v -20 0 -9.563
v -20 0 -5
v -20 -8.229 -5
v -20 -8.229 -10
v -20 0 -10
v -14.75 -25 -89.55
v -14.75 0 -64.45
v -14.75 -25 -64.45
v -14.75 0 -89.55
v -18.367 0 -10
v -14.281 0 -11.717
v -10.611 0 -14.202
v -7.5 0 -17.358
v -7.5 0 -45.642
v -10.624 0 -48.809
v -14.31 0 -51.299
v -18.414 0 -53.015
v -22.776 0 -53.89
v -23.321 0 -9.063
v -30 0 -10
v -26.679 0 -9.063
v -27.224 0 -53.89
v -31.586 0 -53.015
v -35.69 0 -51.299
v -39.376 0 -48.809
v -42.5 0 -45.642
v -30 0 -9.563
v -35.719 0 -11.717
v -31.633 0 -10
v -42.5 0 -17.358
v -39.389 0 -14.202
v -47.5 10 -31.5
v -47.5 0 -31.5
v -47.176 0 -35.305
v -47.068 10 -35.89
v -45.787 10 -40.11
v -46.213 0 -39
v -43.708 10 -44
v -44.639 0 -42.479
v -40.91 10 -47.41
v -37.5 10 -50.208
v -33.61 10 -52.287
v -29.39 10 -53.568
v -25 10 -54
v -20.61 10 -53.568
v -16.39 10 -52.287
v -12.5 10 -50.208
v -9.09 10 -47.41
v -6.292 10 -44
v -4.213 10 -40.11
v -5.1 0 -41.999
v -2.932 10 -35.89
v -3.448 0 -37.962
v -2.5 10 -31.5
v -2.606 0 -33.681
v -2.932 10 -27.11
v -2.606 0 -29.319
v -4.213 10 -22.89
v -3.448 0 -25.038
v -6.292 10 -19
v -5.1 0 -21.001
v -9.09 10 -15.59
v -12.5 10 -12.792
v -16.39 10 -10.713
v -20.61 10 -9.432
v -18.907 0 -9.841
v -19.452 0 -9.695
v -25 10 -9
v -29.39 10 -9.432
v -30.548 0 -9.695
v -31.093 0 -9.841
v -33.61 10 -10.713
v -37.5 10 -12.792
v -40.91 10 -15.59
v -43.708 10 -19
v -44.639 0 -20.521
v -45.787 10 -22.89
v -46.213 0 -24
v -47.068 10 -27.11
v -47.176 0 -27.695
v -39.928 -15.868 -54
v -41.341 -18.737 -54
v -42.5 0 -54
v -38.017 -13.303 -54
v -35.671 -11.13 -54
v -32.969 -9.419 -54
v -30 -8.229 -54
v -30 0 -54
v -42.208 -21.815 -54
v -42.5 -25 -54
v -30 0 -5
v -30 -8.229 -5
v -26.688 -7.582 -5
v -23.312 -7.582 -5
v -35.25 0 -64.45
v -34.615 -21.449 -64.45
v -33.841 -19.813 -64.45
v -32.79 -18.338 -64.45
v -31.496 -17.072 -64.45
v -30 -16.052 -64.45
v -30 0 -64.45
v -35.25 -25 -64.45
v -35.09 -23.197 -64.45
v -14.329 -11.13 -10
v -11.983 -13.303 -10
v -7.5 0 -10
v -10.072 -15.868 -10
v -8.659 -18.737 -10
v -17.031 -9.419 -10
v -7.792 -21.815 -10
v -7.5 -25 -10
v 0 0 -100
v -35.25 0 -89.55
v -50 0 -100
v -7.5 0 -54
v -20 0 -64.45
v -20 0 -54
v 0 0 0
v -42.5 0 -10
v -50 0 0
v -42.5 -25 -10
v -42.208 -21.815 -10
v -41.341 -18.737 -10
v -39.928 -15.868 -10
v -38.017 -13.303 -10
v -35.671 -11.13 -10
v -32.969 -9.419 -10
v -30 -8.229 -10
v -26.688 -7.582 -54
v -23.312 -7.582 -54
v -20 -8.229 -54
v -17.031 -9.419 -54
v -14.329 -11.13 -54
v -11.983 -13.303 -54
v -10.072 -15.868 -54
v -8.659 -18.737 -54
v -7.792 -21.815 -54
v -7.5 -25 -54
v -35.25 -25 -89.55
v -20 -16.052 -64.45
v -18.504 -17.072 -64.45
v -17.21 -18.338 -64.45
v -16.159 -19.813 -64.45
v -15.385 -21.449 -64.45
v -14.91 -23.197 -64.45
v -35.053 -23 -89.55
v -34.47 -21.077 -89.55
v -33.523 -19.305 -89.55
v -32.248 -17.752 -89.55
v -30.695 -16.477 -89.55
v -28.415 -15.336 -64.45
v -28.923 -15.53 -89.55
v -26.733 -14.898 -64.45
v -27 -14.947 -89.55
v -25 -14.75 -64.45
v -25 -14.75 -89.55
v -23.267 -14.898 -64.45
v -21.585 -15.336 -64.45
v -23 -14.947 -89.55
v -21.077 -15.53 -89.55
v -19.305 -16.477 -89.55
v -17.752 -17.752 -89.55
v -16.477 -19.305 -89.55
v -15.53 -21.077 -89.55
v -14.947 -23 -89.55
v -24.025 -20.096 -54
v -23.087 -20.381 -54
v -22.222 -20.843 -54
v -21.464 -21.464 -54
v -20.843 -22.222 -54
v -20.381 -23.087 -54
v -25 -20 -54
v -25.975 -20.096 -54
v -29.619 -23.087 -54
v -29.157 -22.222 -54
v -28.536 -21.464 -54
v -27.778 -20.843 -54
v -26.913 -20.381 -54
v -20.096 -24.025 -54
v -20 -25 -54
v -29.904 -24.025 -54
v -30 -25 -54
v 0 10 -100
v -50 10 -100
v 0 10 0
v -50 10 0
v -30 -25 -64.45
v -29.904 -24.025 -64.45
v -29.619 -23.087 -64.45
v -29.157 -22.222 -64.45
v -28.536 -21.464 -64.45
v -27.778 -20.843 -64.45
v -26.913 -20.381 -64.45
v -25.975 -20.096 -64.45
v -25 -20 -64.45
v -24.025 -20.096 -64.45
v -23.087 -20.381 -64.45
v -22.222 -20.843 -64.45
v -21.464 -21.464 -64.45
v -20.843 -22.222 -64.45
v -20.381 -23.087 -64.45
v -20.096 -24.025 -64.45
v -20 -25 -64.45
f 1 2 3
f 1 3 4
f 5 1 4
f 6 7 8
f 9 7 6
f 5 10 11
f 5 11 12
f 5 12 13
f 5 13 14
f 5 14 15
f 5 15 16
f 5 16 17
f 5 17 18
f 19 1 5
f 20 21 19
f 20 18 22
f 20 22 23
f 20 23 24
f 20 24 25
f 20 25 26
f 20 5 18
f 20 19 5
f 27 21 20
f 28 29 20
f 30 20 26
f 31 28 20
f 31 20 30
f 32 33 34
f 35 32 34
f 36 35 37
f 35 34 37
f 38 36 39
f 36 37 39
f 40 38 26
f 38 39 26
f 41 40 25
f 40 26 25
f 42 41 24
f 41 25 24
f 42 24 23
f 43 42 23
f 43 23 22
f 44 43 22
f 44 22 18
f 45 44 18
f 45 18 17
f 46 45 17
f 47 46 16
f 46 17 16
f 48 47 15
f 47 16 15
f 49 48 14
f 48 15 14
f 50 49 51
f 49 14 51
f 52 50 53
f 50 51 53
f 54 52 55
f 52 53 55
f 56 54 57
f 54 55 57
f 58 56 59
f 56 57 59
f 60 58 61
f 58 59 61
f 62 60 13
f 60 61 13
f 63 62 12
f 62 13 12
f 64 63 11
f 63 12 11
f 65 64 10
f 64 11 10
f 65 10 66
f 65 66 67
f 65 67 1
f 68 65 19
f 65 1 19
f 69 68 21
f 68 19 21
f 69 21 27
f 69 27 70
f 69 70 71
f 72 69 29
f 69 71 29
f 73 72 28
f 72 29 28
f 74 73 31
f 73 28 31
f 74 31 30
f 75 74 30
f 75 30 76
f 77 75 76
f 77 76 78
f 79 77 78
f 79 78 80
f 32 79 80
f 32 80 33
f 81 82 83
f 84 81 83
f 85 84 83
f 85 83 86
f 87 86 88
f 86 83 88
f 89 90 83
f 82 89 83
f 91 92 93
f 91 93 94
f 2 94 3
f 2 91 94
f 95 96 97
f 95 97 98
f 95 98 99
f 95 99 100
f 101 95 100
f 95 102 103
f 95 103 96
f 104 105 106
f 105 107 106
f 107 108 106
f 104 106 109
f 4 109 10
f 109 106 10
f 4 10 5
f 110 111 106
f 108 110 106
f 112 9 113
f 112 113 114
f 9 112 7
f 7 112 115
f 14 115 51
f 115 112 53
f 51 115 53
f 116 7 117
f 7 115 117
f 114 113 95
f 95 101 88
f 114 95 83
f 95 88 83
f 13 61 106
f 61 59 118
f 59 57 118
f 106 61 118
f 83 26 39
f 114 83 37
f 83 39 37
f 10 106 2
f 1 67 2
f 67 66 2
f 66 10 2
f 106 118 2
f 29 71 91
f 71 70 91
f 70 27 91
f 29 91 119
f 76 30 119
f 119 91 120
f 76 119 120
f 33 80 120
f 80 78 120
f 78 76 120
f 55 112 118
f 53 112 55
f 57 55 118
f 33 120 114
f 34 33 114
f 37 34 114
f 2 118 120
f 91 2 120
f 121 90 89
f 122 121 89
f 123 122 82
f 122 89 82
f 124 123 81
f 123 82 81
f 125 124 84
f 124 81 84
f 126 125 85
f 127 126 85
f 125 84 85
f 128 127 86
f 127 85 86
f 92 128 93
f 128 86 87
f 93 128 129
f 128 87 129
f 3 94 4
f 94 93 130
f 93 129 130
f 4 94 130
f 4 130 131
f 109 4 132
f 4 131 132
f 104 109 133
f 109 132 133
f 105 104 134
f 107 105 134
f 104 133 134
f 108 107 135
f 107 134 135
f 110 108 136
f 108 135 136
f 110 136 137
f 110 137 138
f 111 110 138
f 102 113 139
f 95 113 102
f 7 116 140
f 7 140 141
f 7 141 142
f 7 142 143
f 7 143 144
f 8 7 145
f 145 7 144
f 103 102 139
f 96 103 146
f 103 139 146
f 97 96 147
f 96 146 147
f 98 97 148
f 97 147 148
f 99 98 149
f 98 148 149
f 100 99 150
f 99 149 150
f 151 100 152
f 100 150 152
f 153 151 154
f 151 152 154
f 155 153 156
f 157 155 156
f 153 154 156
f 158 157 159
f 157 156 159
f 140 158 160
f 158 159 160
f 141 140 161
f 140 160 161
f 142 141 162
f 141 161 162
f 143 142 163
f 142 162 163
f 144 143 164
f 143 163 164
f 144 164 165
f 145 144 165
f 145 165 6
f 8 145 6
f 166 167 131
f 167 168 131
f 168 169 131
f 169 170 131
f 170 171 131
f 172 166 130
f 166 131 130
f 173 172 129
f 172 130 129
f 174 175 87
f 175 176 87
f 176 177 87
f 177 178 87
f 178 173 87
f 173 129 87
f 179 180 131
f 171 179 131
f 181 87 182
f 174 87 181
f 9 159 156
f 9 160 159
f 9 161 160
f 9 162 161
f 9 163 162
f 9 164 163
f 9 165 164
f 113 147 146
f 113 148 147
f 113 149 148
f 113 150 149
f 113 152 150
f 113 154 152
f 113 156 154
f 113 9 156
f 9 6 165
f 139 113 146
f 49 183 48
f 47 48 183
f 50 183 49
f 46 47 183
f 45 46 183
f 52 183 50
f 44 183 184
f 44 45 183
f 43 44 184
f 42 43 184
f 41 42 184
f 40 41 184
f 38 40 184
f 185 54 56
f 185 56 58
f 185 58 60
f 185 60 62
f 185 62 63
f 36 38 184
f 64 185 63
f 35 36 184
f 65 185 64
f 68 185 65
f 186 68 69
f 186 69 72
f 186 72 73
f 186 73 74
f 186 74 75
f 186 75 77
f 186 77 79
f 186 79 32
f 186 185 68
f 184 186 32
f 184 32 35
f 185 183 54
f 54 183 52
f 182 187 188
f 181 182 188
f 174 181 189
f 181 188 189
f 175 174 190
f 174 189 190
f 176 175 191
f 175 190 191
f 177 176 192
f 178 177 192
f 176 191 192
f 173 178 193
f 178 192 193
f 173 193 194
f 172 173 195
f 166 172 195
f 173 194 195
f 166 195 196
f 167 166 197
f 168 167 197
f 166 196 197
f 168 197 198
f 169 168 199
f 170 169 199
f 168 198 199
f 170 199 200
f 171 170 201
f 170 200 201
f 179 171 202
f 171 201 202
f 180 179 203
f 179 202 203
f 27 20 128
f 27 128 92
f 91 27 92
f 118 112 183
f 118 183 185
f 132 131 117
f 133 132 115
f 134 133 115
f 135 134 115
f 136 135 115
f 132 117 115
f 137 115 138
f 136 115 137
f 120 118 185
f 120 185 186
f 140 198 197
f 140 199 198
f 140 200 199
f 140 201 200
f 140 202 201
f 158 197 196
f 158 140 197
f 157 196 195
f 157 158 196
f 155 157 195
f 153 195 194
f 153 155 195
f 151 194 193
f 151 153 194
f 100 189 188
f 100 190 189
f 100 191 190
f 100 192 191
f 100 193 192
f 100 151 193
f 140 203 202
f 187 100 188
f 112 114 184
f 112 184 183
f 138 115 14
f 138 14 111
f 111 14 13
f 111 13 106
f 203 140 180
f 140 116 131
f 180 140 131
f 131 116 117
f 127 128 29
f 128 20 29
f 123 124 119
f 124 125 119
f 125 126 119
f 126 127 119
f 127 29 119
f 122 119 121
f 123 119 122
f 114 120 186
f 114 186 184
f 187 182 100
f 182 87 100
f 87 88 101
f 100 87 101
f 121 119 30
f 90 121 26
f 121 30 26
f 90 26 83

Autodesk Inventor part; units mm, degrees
ref_plane "YZ Plane" through (0, 0, 0) normal (1, 0, 0) x (0, 1, 0)
ref_plane "XZ Plane" through (0, 0, 0) normal (0, 1, 0) x (-1, 0, 0)
ref_plane "XY Plane" through (0, 0, 0) normal (0, 0, 1) x (1, 0, 0)
sketch "Sketch1" plane through (0, 0, 0) normal (0, 1, 0) x (-1, 0, 0)
  line L0 (0, 0) -> (50, 0)
  line L1 (50, 0) -> (50, -100)
  line L2 (50, -100) -> (0, -100)
  line L3 (0, -100) -> (0, 0)
  line L4 (25, 0) -> (25, -100)
  line L5 (7.5, -54) -> (7.5, -10)
  line L6 (7.5, -10) -> (42.5, -10)
  line L7 (42.5, -10) -> (42.5, -54)
  line L8 (42.5, -54) -> (7.5, -54)
  line L9 (7.5, -54) -> (42.5, -10) construction
  line L10 (7.5, -10) -> (42.5, -54) construction
  line L11 (7.5, -54) -> (51.5, -54) construction
  line L12 (14.75, -64.45) -> (14.75, -89.55)
  line L13 (14.75, -89.55) -> (35.25, -89.55)
  line L14 (35.25, -89.55) -> (35.25, -64.45)
  line L15 (35.25, -64.45) -> (14.75, -64.45)
  line L16 (14.75, -64.45) -> (35.25, -89.55) construction
  line L17 (14.75, -89.55) -> (35.25, -64.45) construction
  line L18 (14.75, -64.45) -> (39.85, -64.45) construction
  line L19 (25, -10) -> (25, -15)
  line L20 (25, -10) -> (30, -10) construction
  line L21 (20, -20) -> (30, -20)
  line L22 (30, -20) -> (30, -10)
  line L23 (30, -10) -> (20, -10)
  line L24 (20, -10) -> (20, -20)
  line L25 (20, -20) -> (30, -10) construction
  line L26 (30, -20) -> (20, -10) construction
  line L27 (20, -20) -> (30, -20) construction
  line L28 (30, -15) -> (20, -15)
  line L29 (20, -10) -> (30, -10)
  line L30 (30, -10) -> (30, -5)
  line L31 (30, -5) -> (20, -5)
  line L32 (20, -5) -> (20, -10)
  line L33 (25, -54) -> (25, -64.45)
  line L34 (30, -54) -> (30, -64.45)
  line L35 (30, -64.45) -> (20, -64.45)
  line L36 (20, -64.45) -> (20, -54)
  line L37 (20, -54) -> (30, -54)
  line L38 (30, -54) -> (20, -64.45) construction
  line L39 (30, -64.45) -> (20, -54) construction
  circle A0 centre (25, -31.5) radius 22.5
  point P0 (25, -32)
  point P1 (25, -77)
  point P2 (25, -77)
  point P3 (25, -59.225)
  dimension "d36" = 45
  dimension "d0" = 50
  dimension "d1" = 100
  dimension "d2" = 44
  dimension "d3" = 90
  dimension "d4" = 35
  dimension "d5" = 10
  dimension "d6" = 25.1
  dimension "d7" = 90
  dimension "d8" = 20.5
  dimension "d9" = 5
  dimension "d10" = 90
  dimension "d11" = 0
  dimension "d23" = 10
  dimension "d24" = 5
  dimension "d25" = 10
extrude "Extrusion1" add sketch "Sketch1" along normal blind 10
ref_plane "Work Plane1" through (-14.75, 0, -89.55) normal (0, 0, -1) x (-1, 0, 0)
ref_plane "Work Plane2" through (-14.75, 0, -64.45) normal (0, 0, -1) x (-1, 0, 0)
ref_plane "Work Plane3" through (-7.5, 0, -54) normal (0, 0, -1) x (-1, 0, 0)
ref_plane "Work Plane4" through (-7.5, 0, -10) normal (0, 0, -1) x (-1, 0, 0)
sketch "Sketch2" plane through (-14.75, 0, -89.55) normal (0, 0, -1) x (-1, 0, 0)
  line L0 (-14.75, 0) -> (35.25, 0) projected
  line L1 (35.25, 0) -> (35.25, 10) projected
  line L2 (-14.75, 10) -> (35.25, 10) projected
  line L3 (-14.75, 0) -> (-14.75, 10) projected
  line L4 (-14.75, 0) -> (35.25, 0)
  line L5 (35.25, 0) -> (35.25, -50)
  line L6 (35.25, -50) -> (-14.75, -50)
  line L7 (-14.75, -50) -> (-14.75, 0)
  line L8 (0, 0) -> (20.5, 0) projected
  circle A0 centre (10.25, -25) radius 10.25
  dimension "d14" = 50
  dimension "d15" = 50
  dimension "d16" = 20.5
sketch "Sketch3" plane through (-7.5, 0, -54) normal (0, 0, -1) x (-1, 0, 0)
  line L0 (42.5, 0) -> (-7.5, 0) projected
  line L1 (-7.5, 0) -> (-7.5, 10) projected
  line L2 (42.5, 10) -> (-7.5, 10) projected
  line L3 (42.5, 0) -> (42.5, 10) projected
  line L4 (-7.5, 0) -> (42.5, 0)
  line L5 (42.5, 0) -> (42.5, -50)
  line L6 (42.5, -50) -> (-7.5, -50)
  line L7 (-7.5, -50) -> (-7.5, 0)
  line L8 (0, 0) -> (35, 0) projected
  circle A0 centre (17.5, -25) radius 17.5
  dimension "d17" = 50
  dimension "d18" = 50
  dimension "d19" = 35
sketch "Sketch4" plane through (-14.75, 0, -64.45) normal (0, 0, -1) x (-1, 0, 0)
  line L0 (35.25, 0) -> (-14.75, 0) projected
  line L1 (-14.75, 0) -> (-14.75, 10) projected
  line L2 (35.25, 10) -> (-14.75, 10) projected
  line L3 (35.25, 0) -> (35.25, 10) projected
  line L4 (-14.75, 0) -> (35.25, 0)
  line L5 (35.25, 0) -> (35.25, -50)
  line L6 (35.25, -50) -> (-14.75, -50)
  line L7 (-14.75, -50) -> (-14.75, 0)
  circle A0 centre (10.25, -25) radius 5
  dimension "d20" = 50
  dimension "d21" = 50
  dimension "d22" = 10
ref_plane "Work Plane5" through (-25, -25, -89.55) normal (0, -1, 0) x (1, 0, 0)
extrude "Extrusion2" add sketch "Sketch1" against normal up to surface (25 mm away) contours L31 L30 A0 L4 | L4 A0 L32 L31 | A0 L30 L6 L4 | L4 L6 L32 A0 | L13 L12 L15 L4 | L4 L15 L14 L13 | L6 L22 L28 L4 | L4 L28 L24 L6 | L15 L36 L8 L4 | L4 L8 L34 L15 | L28 L22 L21 L4 | L4 L21 L24 L28 | L24 L21 L4 A0 L5 L6 | L6 A0 L7 L4 L21 L22 | L6 L7 A0 | A0 L5 L6 | A0 L7 L8 | L8 L5 A0
extrude "Extrusion3" cut sketch "Sketch2" against normal up to surface (25.1 mm away) contours A0
ref_plane "Work Plane6" through (-30, -25, -5) normal (0, 0, 1) x (1, 0, 0)
extrude "Extrusion4" cut sketch "Sketch4" against normal up to surface (59.45 mm away) contours A0
extrude "Extrusion5" cut sketch "Sketch3" against normal up to surface (49 mm away) contours A0
extrude "Extrusion6" cut sketch "Sketch1" along normal up to surface (10 mm away) contours A0 L30 L6 L4 | L4 L6 L32 A0 | L6 L22 L28 L4 | L4 L28 L24 L6 | A0 L6 L30 | L32 L6 A0 | L28 L22 L21 L4 | L4 L21 L24 L28 | L24 L21 L4 A0 L5 L6 | L6 A0 L7 L4 L21 L22 | A0 L7 | L5 A0
properties part number "dcmotor_housing_lid"
